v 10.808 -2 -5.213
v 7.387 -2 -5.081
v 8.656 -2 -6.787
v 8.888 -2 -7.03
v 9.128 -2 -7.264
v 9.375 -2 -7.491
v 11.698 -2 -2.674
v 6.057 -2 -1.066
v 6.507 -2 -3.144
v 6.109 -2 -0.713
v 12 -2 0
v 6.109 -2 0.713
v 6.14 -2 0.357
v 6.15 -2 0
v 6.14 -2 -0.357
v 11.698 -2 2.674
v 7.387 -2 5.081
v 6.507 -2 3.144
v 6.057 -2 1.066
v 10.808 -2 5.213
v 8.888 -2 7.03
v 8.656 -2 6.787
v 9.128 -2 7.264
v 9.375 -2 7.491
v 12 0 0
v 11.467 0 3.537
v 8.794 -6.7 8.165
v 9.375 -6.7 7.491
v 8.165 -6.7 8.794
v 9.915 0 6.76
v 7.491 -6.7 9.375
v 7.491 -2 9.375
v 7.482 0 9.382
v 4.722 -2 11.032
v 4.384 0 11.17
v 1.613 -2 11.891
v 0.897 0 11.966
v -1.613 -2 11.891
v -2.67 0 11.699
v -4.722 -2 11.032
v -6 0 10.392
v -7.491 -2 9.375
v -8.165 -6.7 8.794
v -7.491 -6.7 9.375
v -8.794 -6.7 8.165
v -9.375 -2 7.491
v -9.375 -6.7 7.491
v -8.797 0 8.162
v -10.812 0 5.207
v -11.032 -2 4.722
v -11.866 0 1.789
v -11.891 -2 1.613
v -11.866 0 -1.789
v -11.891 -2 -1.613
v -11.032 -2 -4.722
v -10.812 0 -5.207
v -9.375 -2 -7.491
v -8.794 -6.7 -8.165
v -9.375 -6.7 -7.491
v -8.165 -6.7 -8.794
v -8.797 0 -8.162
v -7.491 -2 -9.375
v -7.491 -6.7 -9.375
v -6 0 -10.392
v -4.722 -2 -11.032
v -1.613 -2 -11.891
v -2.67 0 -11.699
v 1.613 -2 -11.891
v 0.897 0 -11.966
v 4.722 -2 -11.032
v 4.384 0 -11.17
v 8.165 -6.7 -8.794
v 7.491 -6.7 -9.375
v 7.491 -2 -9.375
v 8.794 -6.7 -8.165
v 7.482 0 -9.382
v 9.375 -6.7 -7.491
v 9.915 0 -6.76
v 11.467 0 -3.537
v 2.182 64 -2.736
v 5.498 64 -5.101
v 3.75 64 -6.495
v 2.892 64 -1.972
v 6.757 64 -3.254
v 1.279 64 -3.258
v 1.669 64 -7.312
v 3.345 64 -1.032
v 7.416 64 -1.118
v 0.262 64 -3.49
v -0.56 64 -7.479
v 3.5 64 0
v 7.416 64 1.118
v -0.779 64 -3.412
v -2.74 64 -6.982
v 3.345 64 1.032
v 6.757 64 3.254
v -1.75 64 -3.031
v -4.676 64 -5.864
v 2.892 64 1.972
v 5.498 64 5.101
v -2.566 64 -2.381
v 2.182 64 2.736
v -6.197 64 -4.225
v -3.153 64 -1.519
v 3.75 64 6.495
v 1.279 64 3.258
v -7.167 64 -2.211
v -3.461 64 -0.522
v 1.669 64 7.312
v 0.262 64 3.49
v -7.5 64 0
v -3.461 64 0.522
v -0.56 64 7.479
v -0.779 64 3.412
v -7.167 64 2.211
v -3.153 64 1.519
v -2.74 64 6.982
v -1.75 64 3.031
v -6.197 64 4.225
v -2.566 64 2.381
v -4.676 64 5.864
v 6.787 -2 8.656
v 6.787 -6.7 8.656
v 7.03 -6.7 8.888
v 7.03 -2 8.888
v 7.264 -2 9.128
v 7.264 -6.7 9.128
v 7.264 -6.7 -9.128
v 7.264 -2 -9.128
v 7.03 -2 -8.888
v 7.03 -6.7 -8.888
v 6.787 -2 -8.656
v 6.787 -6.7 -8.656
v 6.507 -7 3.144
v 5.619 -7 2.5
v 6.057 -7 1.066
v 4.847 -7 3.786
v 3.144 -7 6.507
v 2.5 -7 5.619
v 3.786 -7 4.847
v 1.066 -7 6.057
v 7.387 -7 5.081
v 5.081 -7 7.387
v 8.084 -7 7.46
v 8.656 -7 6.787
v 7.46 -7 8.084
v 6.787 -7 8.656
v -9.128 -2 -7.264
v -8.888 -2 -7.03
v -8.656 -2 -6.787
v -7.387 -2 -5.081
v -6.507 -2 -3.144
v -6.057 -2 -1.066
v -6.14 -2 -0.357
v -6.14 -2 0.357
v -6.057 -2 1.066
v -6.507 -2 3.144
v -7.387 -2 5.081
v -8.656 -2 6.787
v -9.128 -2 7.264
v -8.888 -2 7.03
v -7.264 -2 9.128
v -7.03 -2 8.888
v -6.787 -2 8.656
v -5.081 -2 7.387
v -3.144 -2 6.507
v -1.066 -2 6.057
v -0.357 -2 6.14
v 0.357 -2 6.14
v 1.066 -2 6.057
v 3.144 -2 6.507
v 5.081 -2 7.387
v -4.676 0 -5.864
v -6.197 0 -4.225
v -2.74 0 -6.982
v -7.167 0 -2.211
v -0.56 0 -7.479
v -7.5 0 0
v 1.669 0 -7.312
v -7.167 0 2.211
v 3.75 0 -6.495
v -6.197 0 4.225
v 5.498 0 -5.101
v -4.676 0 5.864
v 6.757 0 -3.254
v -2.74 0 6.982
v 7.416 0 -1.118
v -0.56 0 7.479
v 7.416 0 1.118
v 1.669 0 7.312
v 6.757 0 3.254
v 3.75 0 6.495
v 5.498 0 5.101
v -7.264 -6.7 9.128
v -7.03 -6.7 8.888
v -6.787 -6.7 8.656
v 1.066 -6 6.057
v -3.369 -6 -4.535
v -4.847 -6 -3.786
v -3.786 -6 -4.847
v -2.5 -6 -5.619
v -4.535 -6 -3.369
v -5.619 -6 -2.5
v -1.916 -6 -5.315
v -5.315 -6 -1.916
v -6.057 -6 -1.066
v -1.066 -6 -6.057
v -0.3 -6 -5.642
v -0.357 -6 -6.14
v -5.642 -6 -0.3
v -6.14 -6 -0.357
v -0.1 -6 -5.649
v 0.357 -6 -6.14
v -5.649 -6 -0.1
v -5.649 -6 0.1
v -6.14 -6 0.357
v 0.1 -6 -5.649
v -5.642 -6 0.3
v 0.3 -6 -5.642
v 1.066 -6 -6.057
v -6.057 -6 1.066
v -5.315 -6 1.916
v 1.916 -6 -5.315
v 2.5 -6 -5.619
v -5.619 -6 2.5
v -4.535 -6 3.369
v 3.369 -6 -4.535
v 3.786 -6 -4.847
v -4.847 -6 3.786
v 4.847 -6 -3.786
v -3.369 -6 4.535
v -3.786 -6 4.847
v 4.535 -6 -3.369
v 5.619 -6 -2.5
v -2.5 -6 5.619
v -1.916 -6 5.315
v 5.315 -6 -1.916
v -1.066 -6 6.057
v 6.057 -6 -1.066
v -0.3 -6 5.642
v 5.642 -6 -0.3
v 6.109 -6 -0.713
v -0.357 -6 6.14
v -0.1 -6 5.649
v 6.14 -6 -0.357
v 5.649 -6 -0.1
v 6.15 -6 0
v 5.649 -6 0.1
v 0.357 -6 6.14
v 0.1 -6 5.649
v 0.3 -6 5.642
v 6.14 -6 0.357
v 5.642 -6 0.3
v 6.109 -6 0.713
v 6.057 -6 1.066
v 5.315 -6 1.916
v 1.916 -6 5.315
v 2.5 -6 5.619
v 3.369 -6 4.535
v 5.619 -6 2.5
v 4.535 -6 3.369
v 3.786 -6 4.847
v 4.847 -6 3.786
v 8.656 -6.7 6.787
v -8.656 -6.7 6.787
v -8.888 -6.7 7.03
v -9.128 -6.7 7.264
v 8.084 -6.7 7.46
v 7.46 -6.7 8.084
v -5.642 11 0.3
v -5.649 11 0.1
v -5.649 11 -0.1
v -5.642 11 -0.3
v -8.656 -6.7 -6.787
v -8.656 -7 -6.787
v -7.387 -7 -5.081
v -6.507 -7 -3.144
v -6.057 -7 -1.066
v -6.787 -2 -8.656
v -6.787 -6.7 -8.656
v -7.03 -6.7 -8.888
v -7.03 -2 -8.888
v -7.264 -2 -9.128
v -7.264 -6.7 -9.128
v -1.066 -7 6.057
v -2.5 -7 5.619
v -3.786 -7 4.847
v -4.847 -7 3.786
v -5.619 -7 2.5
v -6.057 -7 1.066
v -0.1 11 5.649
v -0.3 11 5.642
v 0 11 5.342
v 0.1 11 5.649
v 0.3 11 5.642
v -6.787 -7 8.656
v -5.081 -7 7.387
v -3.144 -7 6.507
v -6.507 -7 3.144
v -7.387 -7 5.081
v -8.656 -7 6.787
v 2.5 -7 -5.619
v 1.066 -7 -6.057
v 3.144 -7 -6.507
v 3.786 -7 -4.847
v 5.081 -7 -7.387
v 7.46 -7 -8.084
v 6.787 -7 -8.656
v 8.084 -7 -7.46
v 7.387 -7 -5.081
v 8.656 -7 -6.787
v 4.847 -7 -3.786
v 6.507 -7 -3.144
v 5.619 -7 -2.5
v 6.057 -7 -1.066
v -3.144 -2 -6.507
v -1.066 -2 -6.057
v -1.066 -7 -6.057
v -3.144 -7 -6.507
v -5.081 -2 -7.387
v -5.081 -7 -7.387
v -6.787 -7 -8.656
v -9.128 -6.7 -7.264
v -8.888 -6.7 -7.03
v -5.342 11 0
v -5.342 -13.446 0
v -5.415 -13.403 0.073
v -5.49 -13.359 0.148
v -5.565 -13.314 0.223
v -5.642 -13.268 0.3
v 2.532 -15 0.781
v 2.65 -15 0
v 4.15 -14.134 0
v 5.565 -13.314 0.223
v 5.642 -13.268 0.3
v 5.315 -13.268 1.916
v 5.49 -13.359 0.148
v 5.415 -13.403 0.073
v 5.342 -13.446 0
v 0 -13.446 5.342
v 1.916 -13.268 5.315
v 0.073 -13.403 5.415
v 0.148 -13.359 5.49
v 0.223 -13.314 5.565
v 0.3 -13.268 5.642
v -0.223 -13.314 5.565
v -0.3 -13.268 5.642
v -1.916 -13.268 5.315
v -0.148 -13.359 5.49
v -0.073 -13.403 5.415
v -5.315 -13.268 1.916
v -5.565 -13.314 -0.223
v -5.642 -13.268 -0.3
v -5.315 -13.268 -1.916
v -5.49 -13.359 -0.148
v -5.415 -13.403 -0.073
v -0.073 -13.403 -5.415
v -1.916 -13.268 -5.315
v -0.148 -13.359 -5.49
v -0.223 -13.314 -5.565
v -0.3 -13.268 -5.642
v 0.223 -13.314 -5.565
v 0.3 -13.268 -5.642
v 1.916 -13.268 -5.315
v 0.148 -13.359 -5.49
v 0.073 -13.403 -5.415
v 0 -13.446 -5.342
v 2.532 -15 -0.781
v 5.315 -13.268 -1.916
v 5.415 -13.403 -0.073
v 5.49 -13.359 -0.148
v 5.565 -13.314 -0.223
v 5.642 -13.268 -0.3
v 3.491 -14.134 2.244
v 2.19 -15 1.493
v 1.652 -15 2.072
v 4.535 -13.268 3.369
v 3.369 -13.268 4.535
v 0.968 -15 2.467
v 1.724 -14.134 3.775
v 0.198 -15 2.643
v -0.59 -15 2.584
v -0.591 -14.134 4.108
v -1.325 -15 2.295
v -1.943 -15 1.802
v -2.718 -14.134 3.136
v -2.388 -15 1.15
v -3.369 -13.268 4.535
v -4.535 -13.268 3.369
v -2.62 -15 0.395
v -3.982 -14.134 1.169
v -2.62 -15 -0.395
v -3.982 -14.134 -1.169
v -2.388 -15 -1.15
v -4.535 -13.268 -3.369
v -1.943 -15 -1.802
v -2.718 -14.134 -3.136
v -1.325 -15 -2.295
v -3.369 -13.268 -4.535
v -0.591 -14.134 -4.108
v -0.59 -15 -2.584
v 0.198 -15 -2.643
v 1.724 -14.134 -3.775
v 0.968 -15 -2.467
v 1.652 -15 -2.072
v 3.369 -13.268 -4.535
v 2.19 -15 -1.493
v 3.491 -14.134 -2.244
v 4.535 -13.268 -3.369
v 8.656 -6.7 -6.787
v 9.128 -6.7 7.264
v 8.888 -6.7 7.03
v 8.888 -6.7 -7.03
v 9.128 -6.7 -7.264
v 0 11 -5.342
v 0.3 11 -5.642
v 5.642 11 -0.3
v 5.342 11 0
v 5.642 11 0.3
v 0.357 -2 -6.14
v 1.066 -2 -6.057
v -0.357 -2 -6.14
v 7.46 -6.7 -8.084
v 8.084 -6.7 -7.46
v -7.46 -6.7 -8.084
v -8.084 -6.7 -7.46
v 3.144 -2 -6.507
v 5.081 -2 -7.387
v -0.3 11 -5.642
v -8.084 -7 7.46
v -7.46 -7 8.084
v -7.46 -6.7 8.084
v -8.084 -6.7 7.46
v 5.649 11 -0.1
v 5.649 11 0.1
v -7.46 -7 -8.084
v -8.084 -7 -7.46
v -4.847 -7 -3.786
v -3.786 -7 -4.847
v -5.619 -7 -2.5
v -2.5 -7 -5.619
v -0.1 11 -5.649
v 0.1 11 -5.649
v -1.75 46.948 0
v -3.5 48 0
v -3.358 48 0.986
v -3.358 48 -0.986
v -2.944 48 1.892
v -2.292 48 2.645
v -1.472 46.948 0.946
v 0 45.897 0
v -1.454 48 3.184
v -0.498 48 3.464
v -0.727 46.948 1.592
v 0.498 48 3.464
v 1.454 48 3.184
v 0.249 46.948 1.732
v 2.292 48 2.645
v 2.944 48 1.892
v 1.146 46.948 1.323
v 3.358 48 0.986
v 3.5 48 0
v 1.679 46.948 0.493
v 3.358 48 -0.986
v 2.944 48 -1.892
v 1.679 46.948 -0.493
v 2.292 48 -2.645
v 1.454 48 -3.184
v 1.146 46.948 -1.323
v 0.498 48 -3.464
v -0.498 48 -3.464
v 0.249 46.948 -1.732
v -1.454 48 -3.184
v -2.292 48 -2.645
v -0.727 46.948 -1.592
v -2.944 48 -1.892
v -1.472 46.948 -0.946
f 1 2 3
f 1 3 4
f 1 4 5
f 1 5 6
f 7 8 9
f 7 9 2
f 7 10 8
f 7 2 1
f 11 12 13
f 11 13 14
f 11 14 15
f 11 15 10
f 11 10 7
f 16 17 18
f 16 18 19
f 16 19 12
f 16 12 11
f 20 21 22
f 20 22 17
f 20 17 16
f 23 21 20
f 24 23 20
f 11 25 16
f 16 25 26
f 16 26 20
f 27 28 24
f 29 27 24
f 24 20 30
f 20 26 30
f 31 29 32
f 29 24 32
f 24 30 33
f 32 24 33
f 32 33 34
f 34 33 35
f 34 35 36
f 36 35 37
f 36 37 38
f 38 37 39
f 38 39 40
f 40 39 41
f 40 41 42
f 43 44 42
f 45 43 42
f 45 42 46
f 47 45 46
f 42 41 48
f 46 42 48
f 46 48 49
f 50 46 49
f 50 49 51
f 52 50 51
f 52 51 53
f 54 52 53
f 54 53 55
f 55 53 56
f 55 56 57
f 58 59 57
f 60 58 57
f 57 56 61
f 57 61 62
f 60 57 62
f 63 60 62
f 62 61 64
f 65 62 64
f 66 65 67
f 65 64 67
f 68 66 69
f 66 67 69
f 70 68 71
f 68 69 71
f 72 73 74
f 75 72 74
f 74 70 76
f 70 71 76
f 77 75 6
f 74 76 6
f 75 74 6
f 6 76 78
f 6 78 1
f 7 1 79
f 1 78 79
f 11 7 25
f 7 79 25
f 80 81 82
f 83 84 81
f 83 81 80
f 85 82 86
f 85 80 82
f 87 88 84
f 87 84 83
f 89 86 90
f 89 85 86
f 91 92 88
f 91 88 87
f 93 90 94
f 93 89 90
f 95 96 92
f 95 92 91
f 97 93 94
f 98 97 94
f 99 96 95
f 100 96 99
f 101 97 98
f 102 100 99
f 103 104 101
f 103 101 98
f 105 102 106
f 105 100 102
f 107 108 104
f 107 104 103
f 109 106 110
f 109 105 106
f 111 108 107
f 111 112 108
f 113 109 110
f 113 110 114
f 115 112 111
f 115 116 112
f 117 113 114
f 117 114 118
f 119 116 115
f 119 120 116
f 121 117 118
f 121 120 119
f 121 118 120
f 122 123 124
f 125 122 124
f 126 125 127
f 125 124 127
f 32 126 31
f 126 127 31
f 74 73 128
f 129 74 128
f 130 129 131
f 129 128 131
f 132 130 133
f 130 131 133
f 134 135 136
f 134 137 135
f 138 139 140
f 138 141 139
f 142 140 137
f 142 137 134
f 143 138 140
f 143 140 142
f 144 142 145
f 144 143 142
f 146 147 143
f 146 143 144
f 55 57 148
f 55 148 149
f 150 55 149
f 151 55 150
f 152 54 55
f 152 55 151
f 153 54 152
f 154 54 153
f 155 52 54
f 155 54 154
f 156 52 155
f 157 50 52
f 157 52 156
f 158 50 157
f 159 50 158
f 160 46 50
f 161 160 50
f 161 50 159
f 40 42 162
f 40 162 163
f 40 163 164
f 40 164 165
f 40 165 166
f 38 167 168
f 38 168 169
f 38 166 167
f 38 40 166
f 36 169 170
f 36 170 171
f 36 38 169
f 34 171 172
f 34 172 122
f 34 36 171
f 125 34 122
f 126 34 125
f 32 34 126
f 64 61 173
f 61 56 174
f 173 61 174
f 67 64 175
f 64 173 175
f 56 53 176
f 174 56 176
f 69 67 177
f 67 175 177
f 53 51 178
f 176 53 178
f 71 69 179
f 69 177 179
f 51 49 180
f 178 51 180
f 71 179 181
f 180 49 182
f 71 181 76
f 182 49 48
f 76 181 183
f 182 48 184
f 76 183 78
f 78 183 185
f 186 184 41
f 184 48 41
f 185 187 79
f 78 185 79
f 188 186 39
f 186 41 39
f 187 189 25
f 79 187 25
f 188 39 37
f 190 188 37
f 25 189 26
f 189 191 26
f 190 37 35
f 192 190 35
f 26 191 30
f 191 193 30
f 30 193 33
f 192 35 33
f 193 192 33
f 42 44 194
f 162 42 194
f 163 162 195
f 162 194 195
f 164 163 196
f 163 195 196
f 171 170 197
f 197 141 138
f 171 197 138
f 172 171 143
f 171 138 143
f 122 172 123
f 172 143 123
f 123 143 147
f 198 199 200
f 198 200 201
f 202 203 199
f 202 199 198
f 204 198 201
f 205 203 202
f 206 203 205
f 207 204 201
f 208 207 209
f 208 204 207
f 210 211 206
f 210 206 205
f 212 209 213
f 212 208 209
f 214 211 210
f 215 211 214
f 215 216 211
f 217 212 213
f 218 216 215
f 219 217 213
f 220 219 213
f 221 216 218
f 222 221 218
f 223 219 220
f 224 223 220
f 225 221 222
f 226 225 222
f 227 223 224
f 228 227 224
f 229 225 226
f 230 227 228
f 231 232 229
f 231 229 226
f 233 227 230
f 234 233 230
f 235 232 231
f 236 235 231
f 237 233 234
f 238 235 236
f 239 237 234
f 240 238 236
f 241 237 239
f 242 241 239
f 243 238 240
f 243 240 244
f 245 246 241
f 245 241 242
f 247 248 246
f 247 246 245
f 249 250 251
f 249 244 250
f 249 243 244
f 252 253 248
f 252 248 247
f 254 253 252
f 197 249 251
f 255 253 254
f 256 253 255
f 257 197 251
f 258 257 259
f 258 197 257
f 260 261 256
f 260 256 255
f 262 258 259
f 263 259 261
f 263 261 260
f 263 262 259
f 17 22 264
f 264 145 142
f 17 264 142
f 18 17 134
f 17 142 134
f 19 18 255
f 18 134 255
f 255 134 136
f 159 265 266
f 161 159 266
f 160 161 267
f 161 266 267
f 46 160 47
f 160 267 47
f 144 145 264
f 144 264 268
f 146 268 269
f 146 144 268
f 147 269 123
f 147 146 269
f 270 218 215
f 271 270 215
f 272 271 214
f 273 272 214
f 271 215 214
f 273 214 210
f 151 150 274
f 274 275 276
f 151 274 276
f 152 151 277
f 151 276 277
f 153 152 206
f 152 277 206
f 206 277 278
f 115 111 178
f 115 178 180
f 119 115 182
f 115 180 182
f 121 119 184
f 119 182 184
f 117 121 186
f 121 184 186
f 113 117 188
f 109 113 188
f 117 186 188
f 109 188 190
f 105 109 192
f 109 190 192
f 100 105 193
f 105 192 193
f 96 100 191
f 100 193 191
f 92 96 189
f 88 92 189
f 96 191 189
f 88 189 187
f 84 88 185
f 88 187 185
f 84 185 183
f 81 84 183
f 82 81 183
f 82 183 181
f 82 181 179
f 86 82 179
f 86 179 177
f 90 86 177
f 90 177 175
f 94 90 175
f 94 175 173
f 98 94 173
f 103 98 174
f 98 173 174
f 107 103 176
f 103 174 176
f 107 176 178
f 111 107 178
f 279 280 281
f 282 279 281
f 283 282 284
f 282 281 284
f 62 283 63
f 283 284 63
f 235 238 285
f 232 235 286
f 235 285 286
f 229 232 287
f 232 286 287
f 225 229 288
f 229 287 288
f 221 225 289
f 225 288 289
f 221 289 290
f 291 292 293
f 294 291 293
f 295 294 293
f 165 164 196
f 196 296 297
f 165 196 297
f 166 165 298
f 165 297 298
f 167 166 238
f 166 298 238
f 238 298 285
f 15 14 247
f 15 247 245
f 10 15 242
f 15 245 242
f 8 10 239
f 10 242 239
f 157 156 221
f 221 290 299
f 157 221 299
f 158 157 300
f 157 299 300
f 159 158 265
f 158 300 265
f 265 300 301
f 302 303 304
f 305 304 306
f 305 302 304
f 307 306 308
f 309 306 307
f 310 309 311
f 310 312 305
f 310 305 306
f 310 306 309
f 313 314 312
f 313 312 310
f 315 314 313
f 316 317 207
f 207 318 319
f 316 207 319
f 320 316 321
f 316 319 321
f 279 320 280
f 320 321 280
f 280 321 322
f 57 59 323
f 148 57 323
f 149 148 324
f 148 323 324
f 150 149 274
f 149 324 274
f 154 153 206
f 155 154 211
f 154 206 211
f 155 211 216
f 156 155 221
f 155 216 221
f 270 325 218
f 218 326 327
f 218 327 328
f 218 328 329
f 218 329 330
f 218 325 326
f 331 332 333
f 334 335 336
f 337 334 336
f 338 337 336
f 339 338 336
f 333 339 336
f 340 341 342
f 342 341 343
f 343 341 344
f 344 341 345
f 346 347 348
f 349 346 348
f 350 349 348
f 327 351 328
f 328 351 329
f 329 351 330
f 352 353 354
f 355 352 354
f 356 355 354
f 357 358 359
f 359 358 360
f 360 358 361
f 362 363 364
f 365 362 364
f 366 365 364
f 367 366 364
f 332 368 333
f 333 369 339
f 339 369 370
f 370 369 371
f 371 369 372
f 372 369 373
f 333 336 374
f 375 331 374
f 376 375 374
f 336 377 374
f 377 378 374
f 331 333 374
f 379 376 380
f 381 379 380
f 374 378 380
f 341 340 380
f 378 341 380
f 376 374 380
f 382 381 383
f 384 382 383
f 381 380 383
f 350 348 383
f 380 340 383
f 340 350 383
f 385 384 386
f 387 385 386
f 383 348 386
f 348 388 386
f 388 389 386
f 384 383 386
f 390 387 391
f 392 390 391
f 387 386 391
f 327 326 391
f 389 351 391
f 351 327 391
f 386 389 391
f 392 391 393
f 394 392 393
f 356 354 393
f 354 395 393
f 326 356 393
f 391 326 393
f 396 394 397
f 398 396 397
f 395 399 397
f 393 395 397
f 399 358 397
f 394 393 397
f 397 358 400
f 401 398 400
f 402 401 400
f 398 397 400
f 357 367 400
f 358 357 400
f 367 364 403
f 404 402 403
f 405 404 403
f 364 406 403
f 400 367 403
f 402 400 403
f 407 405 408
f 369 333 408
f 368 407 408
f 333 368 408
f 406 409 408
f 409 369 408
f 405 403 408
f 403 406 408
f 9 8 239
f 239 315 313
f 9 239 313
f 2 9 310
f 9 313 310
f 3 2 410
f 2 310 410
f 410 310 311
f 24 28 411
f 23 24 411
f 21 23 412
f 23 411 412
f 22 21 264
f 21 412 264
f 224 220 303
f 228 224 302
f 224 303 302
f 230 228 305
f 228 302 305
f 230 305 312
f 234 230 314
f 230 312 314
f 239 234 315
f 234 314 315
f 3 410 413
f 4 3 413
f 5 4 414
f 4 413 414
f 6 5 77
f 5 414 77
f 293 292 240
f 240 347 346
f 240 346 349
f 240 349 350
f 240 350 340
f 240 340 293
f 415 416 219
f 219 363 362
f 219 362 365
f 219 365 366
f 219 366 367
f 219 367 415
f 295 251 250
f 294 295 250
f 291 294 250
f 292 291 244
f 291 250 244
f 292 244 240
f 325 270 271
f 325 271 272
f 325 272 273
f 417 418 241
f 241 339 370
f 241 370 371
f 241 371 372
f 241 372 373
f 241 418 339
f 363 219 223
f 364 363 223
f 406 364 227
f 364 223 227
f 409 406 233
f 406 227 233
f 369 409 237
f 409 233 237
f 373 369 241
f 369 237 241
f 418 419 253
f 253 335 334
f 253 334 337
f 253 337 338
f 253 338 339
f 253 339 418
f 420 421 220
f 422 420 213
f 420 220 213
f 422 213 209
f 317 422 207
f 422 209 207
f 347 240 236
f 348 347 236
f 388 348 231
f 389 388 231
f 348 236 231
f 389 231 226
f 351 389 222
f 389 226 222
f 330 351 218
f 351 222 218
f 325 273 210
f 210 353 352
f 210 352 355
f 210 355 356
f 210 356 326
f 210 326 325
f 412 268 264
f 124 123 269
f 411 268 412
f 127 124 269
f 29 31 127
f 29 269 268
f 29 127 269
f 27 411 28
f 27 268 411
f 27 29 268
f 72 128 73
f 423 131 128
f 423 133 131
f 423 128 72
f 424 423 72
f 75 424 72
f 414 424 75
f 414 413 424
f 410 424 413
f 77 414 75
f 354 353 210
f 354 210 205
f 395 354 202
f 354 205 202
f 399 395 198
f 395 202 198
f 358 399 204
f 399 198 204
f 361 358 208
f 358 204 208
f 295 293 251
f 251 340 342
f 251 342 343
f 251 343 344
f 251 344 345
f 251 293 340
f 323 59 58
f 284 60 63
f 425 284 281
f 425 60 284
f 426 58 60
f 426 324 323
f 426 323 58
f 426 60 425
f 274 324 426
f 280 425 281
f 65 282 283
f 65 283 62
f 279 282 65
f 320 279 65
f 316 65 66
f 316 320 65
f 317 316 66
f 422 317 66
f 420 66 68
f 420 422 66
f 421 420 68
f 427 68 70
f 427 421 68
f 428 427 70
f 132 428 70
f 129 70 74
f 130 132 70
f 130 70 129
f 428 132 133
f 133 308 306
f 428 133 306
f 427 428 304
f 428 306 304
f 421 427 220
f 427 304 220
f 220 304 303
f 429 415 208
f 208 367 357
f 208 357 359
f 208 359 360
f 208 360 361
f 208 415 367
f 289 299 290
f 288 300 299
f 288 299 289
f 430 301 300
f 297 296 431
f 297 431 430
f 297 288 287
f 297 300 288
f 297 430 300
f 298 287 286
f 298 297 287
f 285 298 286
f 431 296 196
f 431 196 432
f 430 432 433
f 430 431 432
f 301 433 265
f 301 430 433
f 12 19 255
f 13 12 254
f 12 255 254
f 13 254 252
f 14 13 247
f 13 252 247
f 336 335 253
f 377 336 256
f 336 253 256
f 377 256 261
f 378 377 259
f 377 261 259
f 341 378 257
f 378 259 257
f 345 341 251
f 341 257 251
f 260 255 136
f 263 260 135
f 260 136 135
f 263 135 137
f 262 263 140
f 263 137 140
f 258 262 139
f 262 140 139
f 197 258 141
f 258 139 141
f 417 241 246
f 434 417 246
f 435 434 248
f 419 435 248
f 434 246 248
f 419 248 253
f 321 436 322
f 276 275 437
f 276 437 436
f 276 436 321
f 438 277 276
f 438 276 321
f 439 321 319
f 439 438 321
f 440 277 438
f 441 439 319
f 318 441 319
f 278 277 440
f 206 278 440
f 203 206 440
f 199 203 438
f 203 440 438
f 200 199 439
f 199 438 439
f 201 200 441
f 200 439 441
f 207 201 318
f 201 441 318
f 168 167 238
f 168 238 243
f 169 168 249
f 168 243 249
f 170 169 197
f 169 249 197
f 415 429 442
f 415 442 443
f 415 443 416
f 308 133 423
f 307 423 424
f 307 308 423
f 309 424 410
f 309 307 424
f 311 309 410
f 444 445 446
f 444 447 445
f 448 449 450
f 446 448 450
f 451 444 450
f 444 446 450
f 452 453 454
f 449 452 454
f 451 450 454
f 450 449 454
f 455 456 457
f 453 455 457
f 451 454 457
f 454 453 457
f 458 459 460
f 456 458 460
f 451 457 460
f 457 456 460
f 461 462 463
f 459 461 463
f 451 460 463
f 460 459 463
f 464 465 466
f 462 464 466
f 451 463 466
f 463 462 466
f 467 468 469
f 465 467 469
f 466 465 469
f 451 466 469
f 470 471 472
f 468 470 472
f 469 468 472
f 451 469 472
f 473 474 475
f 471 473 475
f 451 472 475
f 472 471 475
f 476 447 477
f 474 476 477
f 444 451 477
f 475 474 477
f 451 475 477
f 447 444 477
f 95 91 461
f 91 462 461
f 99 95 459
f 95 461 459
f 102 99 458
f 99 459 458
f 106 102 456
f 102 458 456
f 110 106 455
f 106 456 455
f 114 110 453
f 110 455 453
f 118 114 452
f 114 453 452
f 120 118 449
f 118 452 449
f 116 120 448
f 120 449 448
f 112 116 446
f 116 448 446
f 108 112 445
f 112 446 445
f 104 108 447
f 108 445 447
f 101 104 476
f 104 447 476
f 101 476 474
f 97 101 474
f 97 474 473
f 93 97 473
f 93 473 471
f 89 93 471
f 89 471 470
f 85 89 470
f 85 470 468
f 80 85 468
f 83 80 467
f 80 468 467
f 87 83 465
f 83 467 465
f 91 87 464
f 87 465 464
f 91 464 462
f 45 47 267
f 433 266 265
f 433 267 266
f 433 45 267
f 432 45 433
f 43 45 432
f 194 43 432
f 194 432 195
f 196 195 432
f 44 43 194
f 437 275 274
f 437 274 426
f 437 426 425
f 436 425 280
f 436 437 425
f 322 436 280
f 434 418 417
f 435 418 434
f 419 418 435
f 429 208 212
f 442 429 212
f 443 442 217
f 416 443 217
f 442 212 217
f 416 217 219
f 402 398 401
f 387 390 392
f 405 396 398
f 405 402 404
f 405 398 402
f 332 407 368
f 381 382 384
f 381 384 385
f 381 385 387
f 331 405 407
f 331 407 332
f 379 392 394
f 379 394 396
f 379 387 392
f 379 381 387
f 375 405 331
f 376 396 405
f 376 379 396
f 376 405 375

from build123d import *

# Parameters (mm, degrees)
F0_R      = 12
F1_DEPTH  = 7
F2_R      = 7.5
F3_DEPTH  = 64
F5_D      = 7
F5_DEPTH  = 16
F5_TIP    = 2.1030121666
F6_R      = 12
F6_R_2    = 11
F7_DEPTH  = 0.3
F8_R      = 5.65
F9_DEPTH  = 8
F10_SIZE2 = 1.7320508076
F10_SIZE  = 3
F11_R     = 6.15
F11_R_2   = 5.65
F12_DEPTH = 1
F14_DEPTH = 5
F16_DEPTH = 26


with BuildPart() as f1:
    # F0 (on Front) → F1 (new body)
    with BuildSketch(Plane.XZ):
        Circle(F0_R)
    extrude(amount=F1_DEPTH)

    # F2 (on face) → F3 (join)
    with BuildSketch(Plane(origin=(0, 0, 0), x_dir=(-1, 0, 0), z_dir=(0, 1, 0))):
        Circle(F2_R)
    extrude(amount=F3_DEPTH)

    # F5
    with Locations(Plane(origin=(0, 64, 0), x_dir=(-1, 0, 0), z_dir=(0, 1, 0))):
        with Locations((0, 0)):
            Hole(F5_D / 2, depth=F5_DEPTH)
            with Locations((0, 0, -(F5_DEPTH + F5_TIP / 2))):  # 118° drill point
                Cone(0, F5_D / 2, F5_TIP, mode=Mode.SUBTRACT)

    # F6 (on face) → F7 (cut)
    with BuildSketch(Plane.XZ.offset(7)):
        Circle(F6_R)
        Circle(F6_R_2, mode=Mode.SUBTRACT)
    extrude(amount=-F7_DEPTH, mode=Mode.SUBTRACT)

    # F8 (on face) → F9 (join)
    with BuildSketch(Plane.XZ.offset(7)):
        Circle(F8_R)
    extrude(amount=F9_DEPTH)

    # F10
    f10_edges = [f1.edges().sort_by_distance(p)[0] for p in [
        (-5.65, -15, 0),
    ]]
    f10_side = f1.faces().sort_by_distance((0, -15, 0))[0]
    chamfer(f10_edges, length=F10_SIZE, length2=F10_SIZE2, reference=f10_side)

    # F11 (on face) → F12 (cut)
    with BuildSketch(Plane.XZ.offset(7)):
        Circle(F11_R)
        Circle(F11_R_2, mode=Mode.SUBTRACT)
    extrude(amount=-F12_DEPTH, mode=Mode.SUBTRACT)

    # F13 (on face) → F14 (cut)
    with BuildSketch(Plane.XZ.offset(7)):
        with BuildLine():
            ThreePointArc((-9.375, 7.4906191333), (-12, 0), (-9.375, -7.4906191333))
            ThreePointArc((-9.375, -7.4906191333), (-9.0067811764, -7.148069004), (-8.65625, -6.7874395716))
            ThreePointArc((-8.65625, -6.7874395716), (-11, 0), (-8.65625, 6.7874395716))
            ThreePointArc((-8.65625, 6.7874395716), (-9.0067811764, 7.148069004), (-9.375, 7.4906191333))
        make_face()
        with BuildLine():
            ThreePointArc((-8.65625, 6.7874395716), (-11, 0), (-8.65625, -6.7874395716))
            ThreePointArc((-8.65625, -6.7874395716), (-6.8954530534, -4.1360881152), (-6.056953125, -1.0657480197))
            ThreePointArc((-6.056953125, -1.0657480197), (-6.15, 0), (-6.056953125, 1.0657480197))
            ThreePointArc((-6.056953125, 1.0657480197), (-6.8954530534, 4.1360881152), (-8.65625, 6.7874395716))
        make_face()
        with BuildLine():
            ThreePointArc((-1.0657480197, 6.056953125), (0, 6.15), (1.0657480197, 6.056953125))
            ThreePointArc((1.0657480197, 6.056953125), (4.1360881152, 6.8954530534), (6.7874395716, 8.65625))
            ThreePointArc((6.7874395716, 8.65625), (0, 11), (-6.7874395716, 8.65625))
            ThreePointArc((-6.7874395716, 8.65625), (-4.1360881152, 6.8954530534), (-1.0657480197, 6.056953125))
        make_face()
        with BuildLine():
            ThreePointArc((7.4906191333, 9.375), (0, 12), (-7.4906191333, 9.375))
            ThreePointArc((-7.4906191333, 9.375), (-7.148069004, 9.0067811764), (-6.7874395716, 8.65625))
            ThreePointArc((-6.7874395716, 8.65625), (0, 11), (6.7874395716, 8.65625))
            ThreePointArc((6.7874395716, 8.65625), (7.148069004, 9.0067811764), (7.4906191333, 9.375))
        make_face()
        with BuildLine():
            ThreePointArc((6.056953125, -1.0657480197), (6.8954530534, -4.1360881152), (8.65625, -6.7874395716))
            ThreePointArc((8.65625, -6.7874395716), (10.3975658209, -3.5903516541), (11, 0))
            ThreePointArc((11, 0), (10.3975658209, 3.5903516541), (8.65625, 6.7874395716))
            ThreePointArc((8.65625, 6.7874395716), (6.8954530534, 4.1360881152), (6.056953125, 1.0657480197))
            ThreePointArc((6.056953125, 1.0657480197), (6.1266941216, 0.5349010569), (6.15, 0))
            ThreePointArc((6.15, 0), (6.1266941216, -0.5349010569), (6.056953125, -1.0657480197))
        make_face()
        with BuildLine():
            ThreePointArc((8.65625, -6.7874395716), (9.0067811764, -7.148069004), (9.375, -7.4906191333))
            ThreePointArc((9.375, -7.4906191333), (11.3247516529, -3.9686269666), (12, 0))
            ThreePointArc((12, 0), (11.3247516529, 3.9686269666), (9.375, 7.4906191333))
            ThreePointArc((9.375, 7.4906191333), (9.0067811764, 7.148069004), (8.65625, 6.7874395716))
            ThreePointArc((8.65625, 6.7874395716), (10.3975658209, 3.5903516541), (11, 0))
            ThreePointArc((11, 0), (10.3975658209, -3.5903516541), (8.65625, -6.7874395716))
        make_face()
        with BuildLine():
            ThreePointArc((-6.7874395716, -8.65625), (0, -11), (6.7874395716, -8.65625))
            ThreePointArc((6.7874395716, -8.65625), (4.1360881152, -6.8954530534), (1.0657480197, -6.056953125))
            ThreePointArc((1.0657480197, -6.056953125), (0, -6.15), (-1.0657480197, -6.056953125))
            ThreePointArc((-1.0657480197, -6.056953125), (-4.1360881152, -6.8954530534), (-6.7874395716, -8.65625))
        make_face()
        with BuildLine():
            ThreePointArc((-7.4906191333, -9.375), (0, -12), (7.4906191333, -9.375))
            ThreePointArc((7.4906191333, -9.375), (7.148069004, -9.0067811764), (6.7874395716, -8.65625))
            ThreePointArc((6.7874395716, -8.65625), (0, -11), (-6.7874395716, -8.65625))
            ThreePointArc((-6.7874395716, -8.65625), (-7.148069004, -9.0067811764), (-7.4906191333, -9.375))
        make_face()
    extrude(amount=-F14_DEPTH, mode=Mode.SUBTRACT)

    # F15 (on face) → F16 (cut)
    with BuildSketch(Plane.XZ.offset(15)):
        with BuildLine():
            Line((0, 5.3420297766), (0.3, 5.6420297766))
            ThreePointArc((0.3, 5.6420297766), (0, 5.65), (-0.3, 5.6420297766))
            Line((-0.3, 5.6420297766), (0, 5.3420297766))
        make_face()
        with BuildLine():
            ThreePointArc((-5.6420297766, 0.3), (-5.65, 0), (-5.6420297766, -0.3))
            Line((-5.6420297766, -0.3), (-5.3420297766, 0))
            Line((-5.3420297766, 0), (-5.6420297766, 0.3))
        make_face()
        with BuildLine():
            ThreePointArc((-0.3, -5.6420297766), (0, -5.65), (0.3, -5.6420297766))
            Line((0.3, -5.6420297766), (0, -5.3420297766))
            Line((0, -5.3420297766), (-0.3, -5.6420297766))
        make_face()
        with BuildLine():
            ThreePointArc((5.6420297766, -0.3), (5.65, 0), (5.6420297766, 0.3))
            Line((5.6420297766, 0.3), (5.3420297766, 0))
            Line((5.3420297766, 0), (5.6420297766, -0.3))
        make_face()
    extrude(amount=-F16_DEPTH, mode=Mode.SUBTRACT)


solid = f1.part
